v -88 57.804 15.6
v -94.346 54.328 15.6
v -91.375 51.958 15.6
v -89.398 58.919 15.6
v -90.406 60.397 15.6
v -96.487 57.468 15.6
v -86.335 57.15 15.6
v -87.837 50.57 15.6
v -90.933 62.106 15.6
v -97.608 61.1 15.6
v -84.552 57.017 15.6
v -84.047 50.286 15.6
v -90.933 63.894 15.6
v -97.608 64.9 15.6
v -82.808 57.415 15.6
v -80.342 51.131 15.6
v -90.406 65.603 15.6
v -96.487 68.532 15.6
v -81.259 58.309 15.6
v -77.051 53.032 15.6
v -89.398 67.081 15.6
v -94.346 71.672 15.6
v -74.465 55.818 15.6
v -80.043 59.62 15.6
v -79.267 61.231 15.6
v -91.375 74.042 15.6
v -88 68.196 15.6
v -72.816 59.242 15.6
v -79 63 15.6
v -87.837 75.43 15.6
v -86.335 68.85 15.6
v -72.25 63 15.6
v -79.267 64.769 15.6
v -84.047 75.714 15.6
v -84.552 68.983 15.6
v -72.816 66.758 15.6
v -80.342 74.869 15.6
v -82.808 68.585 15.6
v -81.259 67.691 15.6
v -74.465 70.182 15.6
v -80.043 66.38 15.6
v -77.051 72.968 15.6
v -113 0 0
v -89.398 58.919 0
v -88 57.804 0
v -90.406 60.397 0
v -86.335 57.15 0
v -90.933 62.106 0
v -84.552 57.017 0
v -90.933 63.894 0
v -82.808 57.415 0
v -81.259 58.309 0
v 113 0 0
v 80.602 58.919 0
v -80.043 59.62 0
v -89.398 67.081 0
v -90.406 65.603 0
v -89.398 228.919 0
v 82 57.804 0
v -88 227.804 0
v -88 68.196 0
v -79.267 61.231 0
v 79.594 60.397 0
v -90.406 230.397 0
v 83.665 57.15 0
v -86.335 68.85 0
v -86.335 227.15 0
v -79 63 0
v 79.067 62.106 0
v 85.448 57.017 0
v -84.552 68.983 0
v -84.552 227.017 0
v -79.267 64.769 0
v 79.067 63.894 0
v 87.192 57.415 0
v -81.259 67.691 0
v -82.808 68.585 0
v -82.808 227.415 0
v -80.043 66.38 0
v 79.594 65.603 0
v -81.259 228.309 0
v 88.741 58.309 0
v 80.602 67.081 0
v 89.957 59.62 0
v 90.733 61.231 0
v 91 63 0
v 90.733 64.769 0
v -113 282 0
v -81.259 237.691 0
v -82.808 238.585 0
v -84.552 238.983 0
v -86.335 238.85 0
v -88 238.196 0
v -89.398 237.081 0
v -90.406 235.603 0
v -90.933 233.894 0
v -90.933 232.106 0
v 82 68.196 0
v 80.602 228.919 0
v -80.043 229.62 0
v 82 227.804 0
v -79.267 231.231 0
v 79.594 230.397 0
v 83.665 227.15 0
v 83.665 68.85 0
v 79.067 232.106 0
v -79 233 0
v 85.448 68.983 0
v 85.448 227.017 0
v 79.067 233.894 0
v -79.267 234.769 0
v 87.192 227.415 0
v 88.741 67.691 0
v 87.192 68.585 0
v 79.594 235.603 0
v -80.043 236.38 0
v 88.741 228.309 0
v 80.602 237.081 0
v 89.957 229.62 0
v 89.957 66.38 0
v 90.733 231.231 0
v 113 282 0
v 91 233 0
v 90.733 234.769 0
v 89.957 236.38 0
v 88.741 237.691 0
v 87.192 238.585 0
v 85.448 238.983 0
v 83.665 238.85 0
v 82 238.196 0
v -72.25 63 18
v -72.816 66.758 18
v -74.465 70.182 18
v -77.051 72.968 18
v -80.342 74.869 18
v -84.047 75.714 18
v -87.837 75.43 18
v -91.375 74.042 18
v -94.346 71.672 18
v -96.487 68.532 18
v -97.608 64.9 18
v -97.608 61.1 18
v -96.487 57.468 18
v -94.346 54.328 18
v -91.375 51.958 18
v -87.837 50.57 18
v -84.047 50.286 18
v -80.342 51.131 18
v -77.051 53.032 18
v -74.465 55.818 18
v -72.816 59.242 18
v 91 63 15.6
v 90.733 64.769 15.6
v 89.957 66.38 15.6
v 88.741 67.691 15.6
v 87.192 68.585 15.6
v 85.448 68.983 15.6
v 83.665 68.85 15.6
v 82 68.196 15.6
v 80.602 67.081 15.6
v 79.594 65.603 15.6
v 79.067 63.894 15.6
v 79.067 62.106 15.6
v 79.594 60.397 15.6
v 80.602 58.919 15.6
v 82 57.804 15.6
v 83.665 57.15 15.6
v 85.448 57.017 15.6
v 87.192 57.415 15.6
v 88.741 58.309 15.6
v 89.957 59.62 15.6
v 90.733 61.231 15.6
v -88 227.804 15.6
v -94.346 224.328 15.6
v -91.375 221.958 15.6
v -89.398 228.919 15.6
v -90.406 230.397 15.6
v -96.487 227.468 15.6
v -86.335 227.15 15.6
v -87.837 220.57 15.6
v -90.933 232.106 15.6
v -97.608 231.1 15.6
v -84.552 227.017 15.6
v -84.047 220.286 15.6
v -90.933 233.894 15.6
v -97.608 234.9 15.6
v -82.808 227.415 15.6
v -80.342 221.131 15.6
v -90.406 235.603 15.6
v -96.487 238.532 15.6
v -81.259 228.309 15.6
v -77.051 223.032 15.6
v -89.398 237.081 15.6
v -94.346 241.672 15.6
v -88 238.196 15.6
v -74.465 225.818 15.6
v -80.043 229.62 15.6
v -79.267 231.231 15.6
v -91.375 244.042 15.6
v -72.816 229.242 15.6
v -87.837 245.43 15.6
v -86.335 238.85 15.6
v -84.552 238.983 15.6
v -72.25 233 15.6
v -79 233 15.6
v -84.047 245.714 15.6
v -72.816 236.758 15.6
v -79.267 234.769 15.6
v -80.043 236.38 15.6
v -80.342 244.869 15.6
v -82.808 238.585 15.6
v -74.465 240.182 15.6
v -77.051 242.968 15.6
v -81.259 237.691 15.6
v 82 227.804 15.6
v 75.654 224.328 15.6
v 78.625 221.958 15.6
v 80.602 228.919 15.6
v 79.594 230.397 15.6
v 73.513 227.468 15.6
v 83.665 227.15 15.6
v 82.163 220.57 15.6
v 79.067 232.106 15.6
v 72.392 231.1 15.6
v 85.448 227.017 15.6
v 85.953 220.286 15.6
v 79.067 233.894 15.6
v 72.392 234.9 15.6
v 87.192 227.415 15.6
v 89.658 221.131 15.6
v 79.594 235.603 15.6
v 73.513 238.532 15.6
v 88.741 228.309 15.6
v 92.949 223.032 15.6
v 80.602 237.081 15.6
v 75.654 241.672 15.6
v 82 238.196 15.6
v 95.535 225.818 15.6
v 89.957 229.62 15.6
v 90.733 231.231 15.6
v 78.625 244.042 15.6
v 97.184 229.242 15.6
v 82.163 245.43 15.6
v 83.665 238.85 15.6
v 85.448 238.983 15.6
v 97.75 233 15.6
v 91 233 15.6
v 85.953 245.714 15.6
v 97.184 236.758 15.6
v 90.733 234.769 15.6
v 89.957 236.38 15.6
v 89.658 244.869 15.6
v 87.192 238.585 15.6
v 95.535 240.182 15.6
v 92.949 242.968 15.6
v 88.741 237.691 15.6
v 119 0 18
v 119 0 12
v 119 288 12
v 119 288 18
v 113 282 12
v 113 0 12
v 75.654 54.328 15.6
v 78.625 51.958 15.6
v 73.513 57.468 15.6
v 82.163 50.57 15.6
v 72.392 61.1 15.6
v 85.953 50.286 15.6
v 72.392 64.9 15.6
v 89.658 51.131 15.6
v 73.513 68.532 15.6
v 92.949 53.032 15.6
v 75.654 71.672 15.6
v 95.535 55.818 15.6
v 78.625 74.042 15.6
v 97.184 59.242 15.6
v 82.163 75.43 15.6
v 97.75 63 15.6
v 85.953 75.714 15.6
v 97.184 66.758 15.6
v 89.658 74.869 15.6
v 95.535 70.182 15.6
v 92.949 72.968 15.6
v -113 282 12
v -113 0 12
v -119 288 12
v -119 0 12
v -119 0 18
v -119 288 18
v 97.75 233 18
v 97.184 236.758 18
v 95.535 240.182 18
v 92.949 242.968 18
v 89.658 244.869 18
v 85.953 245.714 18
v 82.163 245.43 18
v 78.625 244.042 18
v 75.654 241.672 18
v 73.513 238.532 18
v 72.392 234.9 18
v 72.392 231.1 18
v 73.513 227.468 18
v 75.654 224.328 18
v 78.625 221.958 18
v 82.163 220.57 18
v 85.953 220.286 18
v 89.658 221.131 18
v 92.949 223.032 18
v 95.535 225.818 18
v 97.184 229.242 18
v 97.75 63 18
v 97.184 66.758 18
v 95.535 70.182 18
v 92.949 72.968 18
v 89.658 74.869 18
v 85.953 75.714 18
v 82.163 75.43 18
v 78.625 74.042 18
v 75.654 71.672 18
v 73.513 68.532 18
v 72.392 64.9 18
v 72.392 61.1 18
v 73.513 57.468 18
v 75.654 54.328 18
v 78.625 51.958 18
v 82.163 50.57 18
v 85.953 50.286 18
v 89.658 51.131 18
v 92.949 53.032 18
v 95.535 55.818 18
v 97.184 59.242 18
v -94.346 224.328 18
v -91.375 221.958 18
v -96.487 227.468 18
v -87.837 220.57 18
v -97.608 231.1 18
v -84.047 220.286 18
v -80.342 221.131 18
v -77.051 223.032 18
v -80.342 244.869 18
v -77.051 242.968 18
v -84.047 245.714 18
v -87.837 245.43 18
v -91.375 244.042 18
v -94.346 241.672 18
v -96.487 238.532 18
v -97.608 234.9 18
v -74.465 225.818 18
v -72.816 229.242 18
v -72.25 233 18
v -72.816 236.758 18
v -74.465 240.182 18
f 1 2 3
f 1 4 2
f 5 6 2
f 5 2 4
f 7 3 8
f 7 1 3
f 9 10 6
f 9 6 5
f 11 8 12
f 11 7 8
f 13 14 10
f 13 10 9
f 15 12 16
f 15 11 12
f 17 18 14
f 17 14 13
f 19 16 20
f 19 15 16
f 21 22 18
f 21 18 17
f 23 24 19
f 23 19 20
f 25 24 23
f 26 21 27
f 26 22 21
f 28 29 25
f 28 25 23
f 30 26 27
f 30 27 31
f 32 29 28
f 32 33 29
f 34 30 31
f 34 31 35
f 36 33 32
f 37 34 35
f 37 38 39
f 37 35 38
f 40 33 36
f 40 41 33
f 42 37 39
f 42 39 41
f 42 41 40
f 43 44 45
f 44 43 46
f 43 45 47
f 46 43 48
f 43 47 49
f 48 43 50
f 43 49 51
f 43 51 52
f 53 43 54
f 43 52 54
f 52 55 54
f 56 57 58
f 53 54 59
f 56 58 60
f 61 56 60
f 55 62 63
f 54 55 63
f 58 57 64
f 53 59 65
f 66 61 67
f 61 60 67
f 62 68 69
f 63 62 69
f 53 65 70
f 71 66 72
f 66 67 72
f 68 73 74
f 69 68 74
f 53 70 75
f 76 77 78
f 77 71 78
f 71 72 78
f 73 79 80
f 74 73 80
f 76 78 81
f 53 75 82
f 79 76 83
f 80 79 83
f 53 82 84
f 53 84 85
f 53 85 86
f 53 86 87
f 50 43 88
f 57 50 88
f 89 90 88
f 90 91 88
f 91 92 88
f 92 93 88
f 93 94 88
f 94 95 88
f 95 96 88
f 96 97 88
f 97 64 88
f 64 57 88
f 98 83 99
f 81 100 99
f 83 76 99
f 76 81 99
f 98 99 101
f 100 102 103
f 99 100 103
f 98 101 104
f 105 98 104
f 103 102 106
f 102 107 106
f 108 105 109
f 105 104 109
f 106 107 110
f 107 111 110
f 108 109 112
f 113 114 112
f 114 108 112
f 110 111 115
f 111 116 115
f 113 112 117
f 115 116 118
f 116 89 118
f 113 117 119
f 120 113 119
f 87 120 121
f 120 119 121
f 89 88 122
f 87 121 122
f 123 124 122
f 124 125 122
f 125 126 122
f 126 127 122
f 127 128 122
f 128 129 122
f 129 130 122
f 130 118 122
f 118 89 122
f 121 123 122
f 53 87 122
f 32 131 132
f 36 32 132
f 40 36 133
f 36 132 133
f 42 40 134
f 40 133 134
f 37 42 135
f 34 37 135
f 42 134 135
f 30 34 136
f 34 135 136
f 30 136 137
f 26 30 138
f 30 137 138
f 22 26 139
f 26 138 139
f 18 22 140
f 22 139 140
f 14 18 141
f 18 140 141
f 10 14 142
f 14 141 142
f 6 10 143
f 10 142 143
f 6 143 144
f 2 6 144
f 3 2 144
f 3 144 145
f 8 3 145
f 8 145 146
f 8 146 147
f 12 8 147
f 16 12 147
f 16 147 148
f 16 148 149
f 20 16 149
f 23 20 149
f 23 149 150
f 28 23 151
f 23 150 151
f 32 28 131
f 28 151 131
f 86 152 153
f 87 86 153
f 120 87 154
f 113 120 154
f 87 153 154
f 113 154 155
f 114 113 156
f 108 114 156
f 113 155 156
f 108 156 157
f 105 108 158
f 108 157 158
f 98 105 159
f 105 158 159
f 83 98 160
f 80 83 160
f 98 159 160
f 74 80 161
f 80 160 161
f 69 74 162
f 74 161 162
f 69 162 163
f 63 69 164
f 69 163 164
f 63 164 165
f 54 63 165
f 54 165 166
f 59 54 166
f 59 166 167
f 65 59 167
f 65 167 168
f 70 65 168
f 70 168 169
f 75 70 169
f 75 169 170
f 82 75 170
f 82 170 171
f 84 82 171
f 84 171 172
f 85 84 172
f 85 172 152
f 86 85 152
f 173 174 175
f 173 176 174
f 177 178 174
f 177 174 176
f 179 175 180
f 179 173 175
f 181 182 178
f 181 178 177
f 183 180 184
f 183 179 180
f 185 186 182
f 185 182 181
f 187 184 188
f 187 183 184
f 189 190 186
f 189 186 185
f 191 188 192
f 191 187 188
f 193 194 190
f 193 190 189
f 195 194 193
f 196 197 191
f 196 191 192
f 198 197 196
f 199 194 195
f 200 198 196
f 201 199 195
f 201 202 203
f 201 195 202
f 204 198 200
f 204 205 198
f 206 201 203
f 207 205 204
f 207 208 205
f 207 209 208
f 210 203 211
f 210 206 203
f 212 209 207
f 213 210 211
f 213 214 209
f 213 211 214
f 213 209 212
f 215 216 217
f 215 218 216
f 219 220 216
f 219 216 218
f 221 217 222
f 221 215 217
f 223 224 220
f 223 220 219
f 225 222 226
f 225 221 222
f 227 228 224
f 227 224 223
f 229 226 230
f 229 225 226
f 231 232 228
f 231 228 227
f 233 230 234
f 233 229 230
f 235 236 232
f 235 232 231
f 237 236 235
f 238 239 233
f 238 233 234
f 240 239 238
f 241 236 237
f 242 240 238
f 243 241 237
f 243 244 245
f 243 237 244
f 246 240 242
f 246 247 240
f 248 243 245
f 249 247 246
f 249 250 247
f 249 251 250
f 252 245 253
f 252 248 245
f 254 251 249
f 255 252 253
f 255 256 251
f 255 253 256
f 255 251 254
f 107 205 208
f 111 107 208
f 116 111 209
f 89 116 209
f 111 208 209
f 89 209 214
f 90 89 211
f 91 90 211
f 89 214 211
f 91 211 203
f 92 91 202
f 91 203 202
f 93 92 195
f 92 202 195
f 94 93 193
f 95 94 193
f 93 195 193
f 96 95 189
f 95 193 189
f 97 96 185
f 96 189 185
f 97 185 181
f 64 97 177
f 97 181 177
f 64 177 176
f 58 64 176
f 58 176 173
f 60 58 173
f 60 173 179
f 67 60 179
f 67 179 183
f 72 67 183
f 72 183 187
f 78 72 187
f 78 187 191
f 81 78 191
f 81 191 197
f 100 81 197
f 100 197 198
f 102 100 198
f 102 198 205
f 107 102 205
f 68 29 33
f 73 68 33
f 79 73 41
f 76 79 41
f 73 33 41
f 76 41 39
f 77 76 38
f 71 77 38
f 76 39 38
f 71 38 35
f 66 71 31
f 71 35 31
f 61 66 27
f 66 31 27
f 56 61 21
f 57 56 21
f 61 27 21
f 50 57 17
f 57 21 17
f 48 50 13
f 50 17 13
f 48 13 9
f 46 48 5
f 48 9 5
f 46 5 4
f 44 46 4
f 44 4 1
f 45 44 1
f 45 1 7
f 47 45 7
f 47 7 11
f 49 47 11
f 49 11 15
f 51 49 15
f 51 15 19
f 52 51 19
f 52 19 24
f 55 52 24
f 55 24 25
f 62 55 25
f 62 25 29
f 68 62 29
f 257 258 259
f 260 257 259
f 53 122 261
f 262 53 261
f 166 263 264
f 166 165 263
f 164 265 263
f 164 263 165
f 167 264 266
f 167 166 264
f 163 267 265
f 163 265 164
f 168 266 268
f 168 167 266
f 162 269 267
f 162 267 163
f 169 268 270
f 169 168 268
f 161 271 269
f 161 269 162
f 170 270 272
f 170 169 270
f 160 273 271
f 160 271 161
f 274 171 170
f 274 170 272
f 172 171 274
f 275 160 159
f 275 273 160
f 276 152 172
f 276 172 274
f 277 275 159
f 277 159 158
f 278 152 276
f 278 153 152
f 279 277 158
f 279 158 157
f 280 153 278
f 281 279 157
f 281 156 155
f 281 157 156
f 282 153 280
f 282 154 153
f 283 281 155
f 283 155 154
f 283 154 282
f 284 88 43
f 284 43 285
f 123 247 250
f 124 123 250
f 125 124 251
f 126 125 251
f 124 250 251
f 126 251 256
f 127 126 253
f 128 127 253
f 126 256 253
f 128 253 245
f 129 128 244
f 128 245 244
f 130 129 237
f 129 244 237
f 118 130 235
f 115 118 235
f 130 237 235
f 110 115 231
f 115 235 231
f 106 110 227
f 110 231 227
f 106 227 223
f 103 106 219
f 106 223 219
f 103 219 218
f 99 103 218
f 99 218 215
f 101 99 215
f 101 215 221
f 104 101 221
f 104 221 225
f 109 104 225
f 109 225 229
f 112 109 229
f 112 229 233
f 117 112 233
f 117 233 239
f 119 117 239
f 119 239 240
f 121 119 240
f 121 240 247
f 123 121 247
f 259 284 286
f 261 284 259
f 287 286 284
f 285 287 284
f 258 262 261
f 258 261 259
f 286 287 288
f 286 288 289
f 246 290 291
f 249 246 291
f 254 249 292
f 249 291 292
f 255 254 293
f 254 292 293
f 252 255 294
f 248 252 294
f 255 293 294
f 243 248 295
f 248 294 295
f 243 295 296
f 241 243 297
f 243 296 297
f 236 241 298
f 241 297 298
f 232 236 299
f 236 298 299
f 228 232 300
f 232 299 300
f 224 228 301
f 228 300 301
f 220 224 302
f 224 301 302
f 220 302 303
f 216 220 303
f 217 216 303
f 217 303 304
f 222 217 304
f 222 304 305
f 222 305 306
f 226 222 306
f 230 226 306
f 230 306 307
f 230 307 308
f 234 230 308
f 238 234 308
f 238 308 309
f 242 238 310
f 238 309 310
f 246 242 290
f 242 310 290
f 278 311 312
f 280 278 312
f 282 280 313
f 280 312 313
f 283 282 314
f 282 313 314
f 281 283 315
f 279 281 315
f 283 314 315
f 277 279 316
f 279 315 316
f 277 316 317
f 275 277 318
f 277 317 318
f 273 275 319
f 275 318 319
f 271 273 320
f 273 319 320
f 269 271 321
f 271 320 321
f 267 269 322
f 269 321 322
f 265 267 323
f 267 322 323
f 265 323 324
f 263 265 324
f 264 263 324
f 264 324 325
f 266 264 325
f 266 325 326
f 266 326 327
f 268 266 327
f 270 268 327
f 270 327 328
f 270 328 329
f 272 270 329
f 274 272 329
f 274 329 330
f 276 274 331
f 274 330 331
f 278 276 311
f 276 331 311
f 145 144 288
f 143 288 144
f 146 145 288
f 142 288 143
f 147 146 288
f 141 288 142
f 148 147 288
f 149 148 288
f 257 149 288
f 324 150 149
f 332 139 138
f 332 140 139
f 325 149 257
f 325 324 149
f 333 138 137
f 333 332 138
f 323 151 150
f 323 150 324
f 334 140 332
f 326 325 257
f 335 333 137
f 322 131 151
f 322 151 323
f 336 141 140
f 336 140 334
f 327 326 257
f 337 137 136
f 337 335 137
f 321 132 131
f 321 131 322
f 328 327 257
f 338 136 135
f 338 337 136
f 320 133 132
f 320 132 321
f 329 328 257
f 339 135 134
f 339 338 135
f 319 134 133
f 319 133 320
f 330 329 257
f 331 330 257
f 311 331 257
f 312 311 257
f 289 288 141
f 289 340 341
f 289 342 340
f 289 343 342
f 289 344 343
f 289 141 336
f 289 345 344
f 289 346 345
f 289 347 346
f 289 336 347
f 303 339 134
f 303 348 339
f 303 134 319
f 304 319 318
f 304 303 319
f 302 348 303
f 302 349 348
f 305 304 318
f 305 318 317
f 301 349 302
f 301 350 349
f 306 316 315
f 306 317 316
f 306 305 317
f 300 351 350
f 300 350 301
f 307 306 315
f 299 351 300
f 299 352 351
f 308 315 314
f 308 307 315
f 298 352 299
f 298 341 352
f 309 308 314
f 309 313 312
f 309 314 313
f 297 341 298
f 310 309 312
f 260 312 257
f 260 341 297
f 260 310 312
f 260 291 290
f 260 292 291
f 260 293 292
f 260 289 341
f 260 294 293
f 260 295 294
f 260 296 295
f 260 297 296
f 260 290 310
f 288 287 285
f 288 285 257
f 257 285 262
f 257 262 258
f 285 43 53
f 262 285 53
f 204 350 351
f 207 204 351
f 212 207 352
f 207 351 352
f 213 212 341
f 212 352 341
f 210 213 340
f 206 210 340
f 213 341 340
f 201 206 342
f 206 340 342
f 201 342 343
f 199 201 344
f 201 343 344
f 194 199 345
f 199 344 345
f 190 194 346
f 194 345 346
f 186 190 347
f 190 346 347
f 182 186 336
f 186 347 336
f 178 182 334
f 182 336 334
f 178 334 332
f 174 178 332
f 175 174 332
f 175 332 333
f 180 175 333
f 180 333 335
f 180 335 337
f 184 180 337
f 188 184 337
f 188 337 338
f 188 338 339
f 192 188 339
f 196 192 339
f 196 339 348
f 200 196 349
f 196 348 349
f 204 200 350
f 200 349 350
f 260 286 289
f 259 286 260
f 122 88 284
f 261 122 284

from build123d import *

# Parameters (mm, degrees)
SKETCH016_W     = 238
SKETCH016_H     = 288
PAD006_DEPTH    = 18
SKETCH018_W     = 6
SKETCH018_H     = 12
POCKET010_DEPTH = 238
SKETCH017_W     = 6
SKETCH017_H     = 12
POCKET011_DEPTH = 288
SKETCH019_R     = 6
POCKET012_DEPTH = 18
SKETCH020_R     = 12.75
POCKET013_DEPTH = 2.4


with BuildPart() as part:
    # Sketch016 → Pad006 (new body)
    with BuildSketch(Plane.XY):
        with Locations((0, 144)):
            Rectangle(SKETCH016_W, SKETCH016_H)
    extrude(amount=PAD006_DEPTH)

    # Sketch018 → Pocket010 (cut)
    with BuildSketch(Plane(origin=(-119, 0, 0), x_dir=(0, -1, 0), z_dir=(-1, 0, 0))):
        with Locations((-285, 6)):
            Rectangle(SKETCH018_W, SKETCH018_H)
    extrude(amount=-POCKET010_DEPTH, mode=Mode.SUBTRACT)

    # Sketch017 → Pocket011 (cut)
    with BuildSketch(Plane.XZ):
        with Locations((-116, 6)):
            Rectangle(SKETCH017_W, SKETCH017_H)
    pocket011 = extrude(amount=-POCKET011_DEPTH, mode=Mode.SUBTRACT)

    # Mirrored001: Pocket011 across Sketch017 V_Axis
    add(pocket011.mirror(Plane(origin=(0, 0, 0), x_dir=(0, -1, 0), z_dir=(1, 0, 0))), mode=Mode.SUBTRACT)

    # Sketch019 → Pocket012 (cut)
    with BuildSketch(Plane.XY.offset(18)):
        with Locations((-85, 63)):
            Circle(SKETCH019_R)
        with Locations((-85, 233)):
            Circle(SKETCH019_R)
        with Locations((85, 233)):
            Circle(SKETCH019_R)
        with Locations((85, 63)):
            Circle(SKETCH019_R)
    extrude(amount=-POCKET012_DEPTH, mode=Mode.SUBTRACT)

    # Sketch020 → Pocket013 (cut)
    with BuildSketch(Plane.XY.offset(18)):
        with Locations((-85, 63)):
            Circle(SKETCH020_R)
        with Locations((85, 63)):
            Circle(SKETCH020_R)
        with Locations((85, 233)):
            Circle(SKETCH020_R)
        with Locations((-85, 233)):
            Circle(SKETCH020_R)
    extrude(amount=-POCKET013_DEPTH, mode=Mode.SUBTRACT)


solid = part.part
